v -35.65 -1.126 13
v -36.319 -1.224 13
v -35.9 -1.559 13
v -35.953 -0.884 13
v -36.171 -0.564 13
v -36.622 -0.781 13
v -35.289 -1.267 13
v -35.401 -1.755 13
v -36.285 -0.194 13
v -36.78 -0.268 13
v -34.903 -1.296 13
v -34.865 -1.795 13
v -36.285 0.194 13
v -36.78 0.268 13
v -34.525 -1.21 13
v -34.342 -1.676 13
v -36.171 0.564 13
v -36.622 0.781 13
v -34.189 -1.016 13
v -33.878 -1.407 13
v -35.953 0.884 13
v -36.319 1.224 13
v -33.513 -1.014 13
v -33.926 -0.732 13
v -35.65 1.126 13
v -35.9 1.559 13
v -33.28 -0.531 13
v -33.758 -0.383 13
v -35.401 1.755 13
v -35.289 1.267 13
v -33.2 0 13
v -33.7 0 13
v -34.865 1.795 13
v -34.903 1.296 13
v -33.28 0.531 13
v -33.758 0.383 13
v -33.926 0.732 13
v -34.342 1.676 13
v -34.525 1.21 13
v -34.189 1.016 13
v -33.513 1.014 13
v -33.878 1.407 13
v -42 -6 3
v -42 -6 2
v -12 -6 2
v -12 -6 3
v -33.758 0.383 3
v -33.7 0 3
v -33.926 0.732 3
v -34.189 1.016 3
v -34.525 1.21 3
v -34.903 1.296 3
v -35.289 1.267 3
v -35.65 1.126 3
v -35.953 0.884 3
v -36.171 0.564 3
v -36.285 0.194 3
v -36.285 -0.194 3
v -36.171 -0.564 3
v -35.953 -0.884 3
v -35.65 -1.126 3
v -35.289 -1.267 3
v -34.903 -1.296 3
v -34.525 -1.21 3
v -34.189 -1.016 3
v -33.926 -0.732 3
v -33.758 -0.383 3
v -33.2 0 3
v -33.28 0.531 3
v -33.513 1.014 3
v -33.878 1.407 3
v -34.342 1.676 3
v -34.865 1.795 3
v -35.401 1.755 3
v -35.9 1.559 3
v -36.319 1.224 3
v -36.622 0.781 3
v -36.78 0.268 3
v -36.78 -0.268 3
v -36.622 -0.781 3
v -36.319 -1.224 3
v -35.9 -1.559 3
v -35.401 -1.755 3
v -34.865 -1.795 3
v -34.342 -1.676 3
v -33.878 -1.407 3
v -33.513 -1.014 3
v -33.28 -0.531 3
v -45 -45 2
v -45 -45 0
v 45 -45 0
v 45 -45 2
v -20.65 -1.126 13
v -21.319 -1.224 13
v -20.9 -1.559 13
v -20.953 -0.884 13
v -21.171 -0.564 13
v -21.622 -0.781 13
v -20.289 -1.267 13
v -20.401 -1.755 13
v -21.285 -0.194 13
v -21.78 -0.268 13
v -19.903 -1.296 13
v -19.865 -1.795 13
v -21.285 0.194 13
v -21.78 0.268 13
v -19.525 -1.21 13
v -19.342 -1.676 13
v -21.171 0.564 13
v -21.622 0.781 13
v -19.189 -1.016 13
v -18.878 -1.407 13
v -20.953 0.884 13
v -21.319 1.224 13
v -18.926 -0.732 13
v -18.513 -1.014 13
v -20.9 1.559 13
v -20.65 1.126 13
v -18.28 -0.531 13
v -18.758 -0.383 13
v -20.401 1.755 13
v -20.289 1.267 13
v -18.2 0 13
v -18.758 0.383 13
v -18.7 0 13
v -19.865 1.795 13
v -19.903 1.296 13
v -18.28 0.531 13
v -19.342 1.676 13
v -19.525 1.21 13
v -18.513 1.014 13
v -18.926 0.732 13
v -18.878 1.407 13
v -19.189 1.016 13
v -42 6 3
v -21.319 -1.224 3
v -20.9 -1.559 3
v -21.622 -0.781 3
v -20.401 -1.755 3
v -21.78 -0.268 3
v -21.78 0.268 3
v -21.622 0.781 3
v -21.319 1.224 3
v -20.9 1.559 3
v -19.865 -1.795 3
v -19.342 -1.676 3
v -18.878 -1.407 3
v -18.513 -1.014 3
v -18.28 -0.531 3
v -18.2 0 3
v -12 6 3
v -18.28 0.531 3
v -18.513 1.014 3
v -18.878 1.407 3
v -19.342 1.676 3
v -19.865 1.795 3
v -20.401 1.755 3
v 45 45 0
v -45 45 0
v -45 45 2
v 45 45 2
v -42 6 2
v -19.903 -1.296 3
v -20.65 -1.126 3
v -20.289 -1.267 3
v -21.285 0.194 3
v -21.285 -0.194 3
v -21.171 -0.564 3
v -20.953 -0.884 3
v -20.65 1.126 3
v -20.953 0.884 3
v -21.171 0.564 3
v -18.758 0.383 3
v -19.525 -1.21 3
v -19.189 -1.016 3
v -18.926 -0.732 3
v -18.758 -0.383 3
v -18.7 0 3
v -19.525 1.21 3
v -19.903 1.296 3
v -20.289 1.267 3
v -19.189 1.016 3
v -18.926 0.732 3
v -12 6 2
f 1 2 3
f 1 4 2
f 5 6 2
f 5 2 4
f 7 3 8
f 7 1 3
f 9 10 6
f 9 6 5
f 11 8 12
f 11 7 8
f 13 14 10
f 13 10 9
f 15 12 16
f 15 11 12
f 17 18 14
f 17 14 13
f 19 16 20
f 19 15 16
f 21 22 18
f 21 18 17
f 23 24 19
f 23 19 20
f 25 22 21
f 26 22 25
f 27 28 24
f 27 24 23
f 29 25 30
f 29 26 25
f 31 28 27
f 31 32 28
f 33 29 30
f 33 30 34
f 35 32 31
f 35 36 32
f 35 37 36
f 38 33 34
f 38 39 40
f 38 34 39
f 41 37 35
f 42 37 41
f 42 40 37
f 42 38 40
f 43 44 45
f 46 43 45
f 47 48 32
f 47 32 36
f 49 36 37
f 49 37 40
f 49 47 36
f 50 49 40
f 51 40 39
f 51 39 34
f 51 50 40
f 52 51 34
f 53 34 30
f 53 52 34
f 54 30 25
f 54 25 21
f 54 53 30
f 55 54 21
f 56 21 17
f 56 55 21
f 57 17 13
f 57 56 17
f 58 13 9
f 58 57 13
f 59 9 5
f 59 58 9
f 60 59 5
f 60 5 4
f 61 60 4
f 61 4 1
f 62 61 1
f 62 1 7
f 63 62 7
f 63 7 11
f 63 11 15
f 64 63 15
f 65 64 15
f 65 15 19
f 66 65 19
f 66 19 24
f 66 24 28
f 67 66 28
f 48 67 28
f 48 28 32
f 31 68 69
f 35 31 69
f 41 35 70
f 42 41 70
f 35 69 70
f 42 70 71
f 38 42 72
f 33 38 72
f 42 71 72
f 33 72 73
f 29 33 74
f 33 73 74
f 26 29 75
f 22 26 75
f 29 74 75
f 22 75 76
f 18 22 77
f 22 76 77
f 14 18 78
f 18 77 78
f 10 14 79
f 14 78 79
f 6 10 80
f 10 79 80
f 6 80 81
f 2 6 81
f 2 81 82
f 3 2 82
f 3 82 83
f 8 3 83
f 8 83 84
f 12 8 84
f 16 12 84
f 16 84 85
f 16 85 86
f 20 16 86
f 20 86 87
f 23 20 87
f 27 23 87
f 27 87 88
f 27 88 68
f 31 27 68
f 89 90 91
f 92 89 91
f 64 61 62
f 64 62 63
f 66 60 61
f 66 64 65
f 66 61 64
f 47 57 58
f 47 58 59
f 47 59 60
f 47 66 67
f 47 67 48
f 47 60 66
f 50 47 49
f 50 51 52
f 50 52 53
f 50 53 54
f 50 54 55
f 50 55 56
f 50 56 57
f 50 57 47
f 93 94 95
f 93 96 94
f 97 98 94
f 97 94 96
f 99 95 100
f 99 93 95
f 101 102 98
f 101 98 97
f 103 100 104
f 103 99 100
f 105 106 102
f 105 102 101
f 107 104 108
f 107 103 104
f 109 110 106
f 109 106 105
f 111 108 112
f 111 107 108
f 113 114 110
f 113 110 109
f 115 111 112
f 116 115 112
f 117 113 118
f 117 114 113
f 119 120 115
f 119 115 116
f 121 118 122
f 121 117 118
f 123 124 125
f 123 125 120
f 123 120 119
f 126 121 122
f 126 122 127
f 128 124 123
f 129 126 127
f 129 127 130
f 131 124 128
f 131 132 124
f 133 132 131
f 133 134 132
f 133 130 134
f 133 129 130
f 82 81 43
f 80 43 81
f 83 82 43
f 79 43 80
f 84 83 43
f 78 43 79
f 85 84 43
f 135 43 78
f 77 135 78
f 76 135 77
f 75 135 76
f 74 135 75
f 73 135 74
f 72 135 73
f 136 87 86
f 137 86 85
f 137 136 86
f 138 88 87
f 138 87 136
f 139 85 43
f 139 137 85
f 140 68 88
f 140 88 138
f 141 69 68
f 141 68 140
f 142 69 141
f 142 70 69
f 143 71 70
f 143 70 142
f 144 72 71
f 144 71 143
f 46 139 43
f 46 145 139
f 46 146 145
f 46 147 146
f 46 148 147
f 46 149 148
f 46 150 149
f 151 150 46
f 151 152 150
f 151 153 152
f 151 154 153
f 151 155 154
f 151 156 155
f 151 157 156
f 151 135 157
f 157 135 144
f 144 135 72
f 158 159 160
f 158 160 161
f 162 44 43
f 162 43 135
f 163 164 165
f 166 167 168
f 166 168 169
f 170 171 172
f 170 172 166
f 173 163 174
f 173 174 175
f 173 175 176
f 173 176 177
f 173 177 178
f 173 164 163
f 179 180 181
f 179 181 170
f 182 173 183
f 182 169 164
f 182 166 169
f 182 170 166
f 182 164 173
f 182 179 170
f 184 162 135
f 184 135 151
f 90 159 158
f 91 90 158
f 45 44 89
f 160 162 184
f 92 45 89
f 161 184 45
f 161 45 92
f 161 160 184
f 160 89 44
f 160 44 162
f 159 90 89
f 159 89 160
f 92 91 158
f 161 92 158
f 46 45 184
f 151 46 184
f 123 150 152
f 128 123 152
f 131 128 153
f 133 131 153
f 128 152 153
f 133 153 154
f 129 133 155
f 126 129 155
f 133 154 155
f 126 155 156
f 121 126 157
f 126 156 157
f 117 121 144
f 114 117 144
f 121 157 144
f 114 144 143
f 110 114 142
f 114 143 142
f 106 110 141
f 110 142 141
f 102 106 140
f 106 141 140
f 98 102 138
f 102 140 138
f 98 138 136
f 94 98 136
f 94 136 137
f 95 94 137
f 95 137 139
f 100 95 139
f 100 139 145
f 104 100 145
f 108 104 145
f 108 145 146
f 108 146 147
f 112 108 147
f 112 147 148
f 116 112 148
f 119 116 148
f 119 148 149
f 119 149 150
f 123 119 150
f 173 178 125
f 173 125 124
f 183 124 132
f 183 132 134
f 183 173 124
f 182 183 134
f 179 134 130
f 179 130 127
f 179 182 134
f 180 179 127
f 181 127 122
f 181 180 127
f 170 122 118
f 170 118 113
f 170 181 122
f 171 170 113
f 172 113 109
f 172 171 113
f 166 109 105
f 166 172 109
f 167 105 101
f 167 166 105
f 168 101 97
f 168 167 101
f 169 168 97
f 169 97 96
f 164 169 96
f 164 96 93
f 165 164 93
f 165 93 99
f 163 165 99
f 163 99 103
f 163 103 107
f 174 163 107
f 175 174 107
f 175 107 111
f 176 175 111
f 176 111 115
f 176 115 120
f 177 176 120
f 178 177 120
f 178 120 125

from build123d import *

# Parameters (mm, degrees)
F0_R     = 1.8
F0_R_2   = 1.3
F1_DEPTH = 13
F0_W     = 30
F0_H     = 12
F2_DEPTH = 3
F0_W_2   = 90
F0_H_2   = 90
F3_DEPTH = 2


with BuildPart() as f1:
    # F0 (on Top) → F1 (new body)
    with BuildSketch(Plane.XY):
        with Locations((-35, 0)):
            Circle(F0_R)
        with Locations((-35, 0)):
            Circle(F0_R_2, mode=Mode.SUBTRACT)
    extrude(amount=F1_DEPTH)



with BuildPart() as f1b:
    # F0 (on Top) → F1, piece 2 (new body)
    with BuildSketch(Plane.XY):
        with Locations((-20, 0)):
            Circle(F0_R)
        with Locations((-20, 0)):
            Circle(F0_R_2, mode=Mode.SUBTRACT)
    extrude(amount=F1_DEPTH)


with BuildPart() as f1_1:
    add(f1.part)

    add(f1b.part)  # F2 merges F1b
    # F0 (on Top) → F2 (join)
    with BuildSketch(Plane.XY):
        with Locations((-27, 0)):
            Rectangle(F0_W, F0_H)
        with Locations((-35, 0)):
            Circle(F0_R, mode=Mode.SUBTRACT)
        with Locations((-20, 0)):
            Circle(F0_R, mode=Mode.SUBTRACT)
        with Locations((-20, 0)):
            Circle(F0_R_2)
        with Locations((-35, 0)):
            Circle(F0_R_2)
    extrude(amount=F2_DEPTH)

    # F0 (on Top) → F3 (join)
    with BuildSketch(Plane.XY):
        Rectangle(F0_W_2, F0_H_2)
        with Locations((-27, 0)):
            Rectangle(F0_W, F0_H, mode=Mode.SUBTRACT)
    extrude(amount=F3_DEPTH)


solid = f1_1.part
